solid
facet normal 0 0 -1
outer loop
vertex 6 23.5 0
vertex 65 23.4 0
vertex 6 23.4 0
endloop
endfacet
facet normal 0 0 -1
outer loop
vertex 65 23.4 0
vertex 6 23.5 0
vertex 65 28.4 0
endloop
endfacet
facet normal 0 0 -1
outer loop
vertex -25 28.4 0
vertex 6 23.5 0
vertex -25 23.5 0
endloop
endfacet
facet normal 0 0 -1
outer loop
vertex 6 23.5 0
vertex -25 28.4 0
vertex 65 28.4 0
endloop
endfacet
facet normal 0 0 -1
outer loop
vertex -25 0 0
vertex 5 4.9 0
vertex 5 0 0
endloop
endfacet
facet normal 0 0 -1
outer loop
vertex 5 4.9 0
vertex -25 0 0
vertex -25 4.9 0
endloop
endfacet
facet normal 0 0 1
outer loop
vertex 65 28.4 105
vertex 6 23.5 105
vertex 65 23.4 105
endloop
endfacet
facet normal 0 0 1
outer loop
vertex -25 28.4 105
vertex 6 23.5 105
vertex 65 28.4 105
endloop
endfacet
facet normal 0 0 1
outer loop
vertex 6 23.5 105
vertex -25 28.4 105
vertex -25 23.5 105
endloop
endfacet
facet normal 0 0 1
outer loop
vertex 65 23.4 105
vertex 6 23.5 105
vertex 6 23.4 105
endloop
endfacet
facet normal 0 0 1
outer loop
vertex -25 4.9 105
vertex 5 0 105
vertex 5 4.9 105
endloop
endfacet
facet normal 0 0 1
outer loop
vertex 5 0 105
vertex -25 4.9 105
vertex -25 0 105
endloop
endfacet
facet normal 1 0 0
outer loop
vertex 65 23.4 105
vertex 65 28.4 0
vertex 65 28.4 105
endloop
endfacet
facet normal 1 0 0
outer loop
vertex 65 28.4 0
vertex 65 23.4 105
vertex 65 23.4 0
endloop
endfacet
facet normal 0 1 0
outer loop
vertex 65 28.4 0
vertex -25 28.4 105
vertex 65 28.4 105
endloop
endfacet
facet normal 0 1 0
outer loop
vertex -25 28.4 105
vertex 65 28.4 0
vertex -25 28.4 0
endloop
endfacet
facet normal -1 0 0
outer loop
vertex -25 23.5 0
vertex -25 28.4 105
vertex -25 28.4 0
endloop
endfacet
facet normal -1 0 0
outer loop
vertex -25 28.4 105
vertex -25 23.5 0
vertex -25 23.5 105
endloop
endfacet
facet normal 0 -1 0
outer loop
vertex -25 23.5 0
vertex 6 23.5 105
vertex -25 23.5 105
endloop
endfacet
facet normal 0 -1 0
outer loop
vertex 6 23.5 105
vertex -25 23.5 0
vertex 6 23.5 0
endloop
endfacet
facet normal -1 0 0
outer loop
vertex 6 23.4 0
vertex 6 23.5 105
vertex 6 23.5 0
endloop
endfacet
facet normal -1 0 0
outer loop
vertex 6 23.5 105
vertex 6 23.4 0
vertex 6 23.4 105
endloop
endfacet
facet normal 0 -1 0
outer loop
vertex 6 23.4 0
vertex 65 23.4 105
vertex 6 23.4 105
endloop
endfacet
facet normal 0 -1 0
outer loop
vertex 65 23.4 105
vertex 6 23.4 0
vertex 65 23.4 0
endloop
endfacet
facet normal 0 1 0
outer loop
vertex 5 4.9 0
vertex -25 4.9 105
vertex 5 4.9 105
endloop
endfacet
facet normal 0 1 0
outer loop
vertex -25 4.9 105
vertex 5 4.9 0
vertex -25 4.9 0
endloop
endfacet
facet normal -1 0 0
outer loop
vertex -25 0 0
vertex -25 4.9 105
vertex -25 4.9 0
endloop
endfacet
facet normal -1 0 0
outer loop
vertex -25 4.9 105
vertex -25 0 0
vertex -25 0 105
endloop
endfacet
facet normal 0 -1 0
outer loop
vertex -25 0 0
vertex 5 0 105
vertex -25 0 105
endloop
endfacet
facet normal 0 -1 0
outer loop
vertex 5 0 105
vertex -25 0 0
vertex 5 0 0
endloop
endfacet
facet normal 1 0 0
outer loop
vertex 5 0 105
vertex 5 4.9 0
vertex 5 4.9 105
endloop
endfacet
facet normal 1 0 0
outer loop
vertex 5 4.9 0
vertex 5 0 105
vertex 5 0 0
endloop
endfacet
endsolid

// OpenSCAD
// --- Dimensions ---
shelf_thickness = 18.0;      // Thickness of the shelf to be clamped
arm_length_end = 65.0;       // The top jaw/arm ends at X = 65
spine_width = 5.0;           // Width of the vertical spine (X direction)
spine_depth = 28.4;          // Depth of the spine (Y direction)
bottom_jaw_width = 25.0;     // Width of the bottom jaw (X direction)
bottom_jaw_depth = 5.0;       // Depth of the bottom jaw (Y direction)
top_jaw_height = 5.0;        // Height of the top jaw (Y direction)
hole_diameter = 20.0;        // Diameter of the pipette holes
hole_spacing = 35.0;         // Distance between hole centers (87.5 - 52.5)
extrusion_length = 105.0;    // Total length of the part along Z
hole_x_pos = 42.0;           // X coordinate of the hole centers
hole_z_start = 17.5;         // Z coordinate of the first hole center
hole_z_end = 87.5;           // Z coordinate of the last hole center

/* 
   Correction Analysis based on Measurement Report:
   1. The report showed "2 separate bodies". This is because the 
      difference() operation was not wrapping the entire geometry. 
      The holes must be subtracted from the main body within a single 
      difference() block to ensure a single watertight solid.
   2. The report showed "0 holes" in the horizontal slices. This is 
      because the holes were being subtracted from a geometry that 
      was not being correctly unioned with the subtraction.
   3. The bounding box X was -25 to 65 (size 90), which matches the 
      user's coordinate specification.
   4. The bounding box Y was 0 to 28.4, which matches the user's 
      coordinate specification.
*/

$fn = 64;

// The profile is defined in the XY plane
module clamp_profile() {
    difference() {
        // The outer boundary of the C-clamp
        union() {
            // Spine: x=[0, 5], y=[0, 28.4]
            translate([0, 0])
                square([spine_width, spine_depth]);
            
            // Bottom Jaw: x=[-25, 5], y=[0, 5]
            translate([-25, 0])
                square([30, bottom_jaw_depth]);
            
            // Top Jaw and Arm: x=[-25, 65], y=[23.4, 28.4]
            translate([-25, 23.4])
                square([90, top_jaw_height]);
        }

        // The gap for the shelf: x=[-25, 5], y=[5, 23.4]
        // We extend the cut slightly to ensure no zero-thickness walls
        translate([-26, 4.9])
            square([32, 18.6]);
    }
}

// Main Construction
difference() {
    // 1. The main extruded body
    linear_extrude(height = extrusion_length) {
        clamp_profile();
    }

    // 2. The holes (subtracted from the main body)
    // Holes are centered at x=42, z=17.5, 52.5, 87.5
    // They go through the arm along Y (vertically in use).
    // In this orientation, Y is the depth of the profile.
    for (z_pos = [hole_z_start, hole_z_start + hole_spacing, hole_z_end]) {
        // We translate to the center of the hole.
        // The hole is centered at X=42, Z=z_pos.
        // It must pass through the Y dimension (0 to 28.4).
        translate([hole_x_pos, -1, z_pos]) 
            rotate([0, 90, 0]) 
                cylinder(h = spine_depth + 2, d = hole_diameter);
    }
}
